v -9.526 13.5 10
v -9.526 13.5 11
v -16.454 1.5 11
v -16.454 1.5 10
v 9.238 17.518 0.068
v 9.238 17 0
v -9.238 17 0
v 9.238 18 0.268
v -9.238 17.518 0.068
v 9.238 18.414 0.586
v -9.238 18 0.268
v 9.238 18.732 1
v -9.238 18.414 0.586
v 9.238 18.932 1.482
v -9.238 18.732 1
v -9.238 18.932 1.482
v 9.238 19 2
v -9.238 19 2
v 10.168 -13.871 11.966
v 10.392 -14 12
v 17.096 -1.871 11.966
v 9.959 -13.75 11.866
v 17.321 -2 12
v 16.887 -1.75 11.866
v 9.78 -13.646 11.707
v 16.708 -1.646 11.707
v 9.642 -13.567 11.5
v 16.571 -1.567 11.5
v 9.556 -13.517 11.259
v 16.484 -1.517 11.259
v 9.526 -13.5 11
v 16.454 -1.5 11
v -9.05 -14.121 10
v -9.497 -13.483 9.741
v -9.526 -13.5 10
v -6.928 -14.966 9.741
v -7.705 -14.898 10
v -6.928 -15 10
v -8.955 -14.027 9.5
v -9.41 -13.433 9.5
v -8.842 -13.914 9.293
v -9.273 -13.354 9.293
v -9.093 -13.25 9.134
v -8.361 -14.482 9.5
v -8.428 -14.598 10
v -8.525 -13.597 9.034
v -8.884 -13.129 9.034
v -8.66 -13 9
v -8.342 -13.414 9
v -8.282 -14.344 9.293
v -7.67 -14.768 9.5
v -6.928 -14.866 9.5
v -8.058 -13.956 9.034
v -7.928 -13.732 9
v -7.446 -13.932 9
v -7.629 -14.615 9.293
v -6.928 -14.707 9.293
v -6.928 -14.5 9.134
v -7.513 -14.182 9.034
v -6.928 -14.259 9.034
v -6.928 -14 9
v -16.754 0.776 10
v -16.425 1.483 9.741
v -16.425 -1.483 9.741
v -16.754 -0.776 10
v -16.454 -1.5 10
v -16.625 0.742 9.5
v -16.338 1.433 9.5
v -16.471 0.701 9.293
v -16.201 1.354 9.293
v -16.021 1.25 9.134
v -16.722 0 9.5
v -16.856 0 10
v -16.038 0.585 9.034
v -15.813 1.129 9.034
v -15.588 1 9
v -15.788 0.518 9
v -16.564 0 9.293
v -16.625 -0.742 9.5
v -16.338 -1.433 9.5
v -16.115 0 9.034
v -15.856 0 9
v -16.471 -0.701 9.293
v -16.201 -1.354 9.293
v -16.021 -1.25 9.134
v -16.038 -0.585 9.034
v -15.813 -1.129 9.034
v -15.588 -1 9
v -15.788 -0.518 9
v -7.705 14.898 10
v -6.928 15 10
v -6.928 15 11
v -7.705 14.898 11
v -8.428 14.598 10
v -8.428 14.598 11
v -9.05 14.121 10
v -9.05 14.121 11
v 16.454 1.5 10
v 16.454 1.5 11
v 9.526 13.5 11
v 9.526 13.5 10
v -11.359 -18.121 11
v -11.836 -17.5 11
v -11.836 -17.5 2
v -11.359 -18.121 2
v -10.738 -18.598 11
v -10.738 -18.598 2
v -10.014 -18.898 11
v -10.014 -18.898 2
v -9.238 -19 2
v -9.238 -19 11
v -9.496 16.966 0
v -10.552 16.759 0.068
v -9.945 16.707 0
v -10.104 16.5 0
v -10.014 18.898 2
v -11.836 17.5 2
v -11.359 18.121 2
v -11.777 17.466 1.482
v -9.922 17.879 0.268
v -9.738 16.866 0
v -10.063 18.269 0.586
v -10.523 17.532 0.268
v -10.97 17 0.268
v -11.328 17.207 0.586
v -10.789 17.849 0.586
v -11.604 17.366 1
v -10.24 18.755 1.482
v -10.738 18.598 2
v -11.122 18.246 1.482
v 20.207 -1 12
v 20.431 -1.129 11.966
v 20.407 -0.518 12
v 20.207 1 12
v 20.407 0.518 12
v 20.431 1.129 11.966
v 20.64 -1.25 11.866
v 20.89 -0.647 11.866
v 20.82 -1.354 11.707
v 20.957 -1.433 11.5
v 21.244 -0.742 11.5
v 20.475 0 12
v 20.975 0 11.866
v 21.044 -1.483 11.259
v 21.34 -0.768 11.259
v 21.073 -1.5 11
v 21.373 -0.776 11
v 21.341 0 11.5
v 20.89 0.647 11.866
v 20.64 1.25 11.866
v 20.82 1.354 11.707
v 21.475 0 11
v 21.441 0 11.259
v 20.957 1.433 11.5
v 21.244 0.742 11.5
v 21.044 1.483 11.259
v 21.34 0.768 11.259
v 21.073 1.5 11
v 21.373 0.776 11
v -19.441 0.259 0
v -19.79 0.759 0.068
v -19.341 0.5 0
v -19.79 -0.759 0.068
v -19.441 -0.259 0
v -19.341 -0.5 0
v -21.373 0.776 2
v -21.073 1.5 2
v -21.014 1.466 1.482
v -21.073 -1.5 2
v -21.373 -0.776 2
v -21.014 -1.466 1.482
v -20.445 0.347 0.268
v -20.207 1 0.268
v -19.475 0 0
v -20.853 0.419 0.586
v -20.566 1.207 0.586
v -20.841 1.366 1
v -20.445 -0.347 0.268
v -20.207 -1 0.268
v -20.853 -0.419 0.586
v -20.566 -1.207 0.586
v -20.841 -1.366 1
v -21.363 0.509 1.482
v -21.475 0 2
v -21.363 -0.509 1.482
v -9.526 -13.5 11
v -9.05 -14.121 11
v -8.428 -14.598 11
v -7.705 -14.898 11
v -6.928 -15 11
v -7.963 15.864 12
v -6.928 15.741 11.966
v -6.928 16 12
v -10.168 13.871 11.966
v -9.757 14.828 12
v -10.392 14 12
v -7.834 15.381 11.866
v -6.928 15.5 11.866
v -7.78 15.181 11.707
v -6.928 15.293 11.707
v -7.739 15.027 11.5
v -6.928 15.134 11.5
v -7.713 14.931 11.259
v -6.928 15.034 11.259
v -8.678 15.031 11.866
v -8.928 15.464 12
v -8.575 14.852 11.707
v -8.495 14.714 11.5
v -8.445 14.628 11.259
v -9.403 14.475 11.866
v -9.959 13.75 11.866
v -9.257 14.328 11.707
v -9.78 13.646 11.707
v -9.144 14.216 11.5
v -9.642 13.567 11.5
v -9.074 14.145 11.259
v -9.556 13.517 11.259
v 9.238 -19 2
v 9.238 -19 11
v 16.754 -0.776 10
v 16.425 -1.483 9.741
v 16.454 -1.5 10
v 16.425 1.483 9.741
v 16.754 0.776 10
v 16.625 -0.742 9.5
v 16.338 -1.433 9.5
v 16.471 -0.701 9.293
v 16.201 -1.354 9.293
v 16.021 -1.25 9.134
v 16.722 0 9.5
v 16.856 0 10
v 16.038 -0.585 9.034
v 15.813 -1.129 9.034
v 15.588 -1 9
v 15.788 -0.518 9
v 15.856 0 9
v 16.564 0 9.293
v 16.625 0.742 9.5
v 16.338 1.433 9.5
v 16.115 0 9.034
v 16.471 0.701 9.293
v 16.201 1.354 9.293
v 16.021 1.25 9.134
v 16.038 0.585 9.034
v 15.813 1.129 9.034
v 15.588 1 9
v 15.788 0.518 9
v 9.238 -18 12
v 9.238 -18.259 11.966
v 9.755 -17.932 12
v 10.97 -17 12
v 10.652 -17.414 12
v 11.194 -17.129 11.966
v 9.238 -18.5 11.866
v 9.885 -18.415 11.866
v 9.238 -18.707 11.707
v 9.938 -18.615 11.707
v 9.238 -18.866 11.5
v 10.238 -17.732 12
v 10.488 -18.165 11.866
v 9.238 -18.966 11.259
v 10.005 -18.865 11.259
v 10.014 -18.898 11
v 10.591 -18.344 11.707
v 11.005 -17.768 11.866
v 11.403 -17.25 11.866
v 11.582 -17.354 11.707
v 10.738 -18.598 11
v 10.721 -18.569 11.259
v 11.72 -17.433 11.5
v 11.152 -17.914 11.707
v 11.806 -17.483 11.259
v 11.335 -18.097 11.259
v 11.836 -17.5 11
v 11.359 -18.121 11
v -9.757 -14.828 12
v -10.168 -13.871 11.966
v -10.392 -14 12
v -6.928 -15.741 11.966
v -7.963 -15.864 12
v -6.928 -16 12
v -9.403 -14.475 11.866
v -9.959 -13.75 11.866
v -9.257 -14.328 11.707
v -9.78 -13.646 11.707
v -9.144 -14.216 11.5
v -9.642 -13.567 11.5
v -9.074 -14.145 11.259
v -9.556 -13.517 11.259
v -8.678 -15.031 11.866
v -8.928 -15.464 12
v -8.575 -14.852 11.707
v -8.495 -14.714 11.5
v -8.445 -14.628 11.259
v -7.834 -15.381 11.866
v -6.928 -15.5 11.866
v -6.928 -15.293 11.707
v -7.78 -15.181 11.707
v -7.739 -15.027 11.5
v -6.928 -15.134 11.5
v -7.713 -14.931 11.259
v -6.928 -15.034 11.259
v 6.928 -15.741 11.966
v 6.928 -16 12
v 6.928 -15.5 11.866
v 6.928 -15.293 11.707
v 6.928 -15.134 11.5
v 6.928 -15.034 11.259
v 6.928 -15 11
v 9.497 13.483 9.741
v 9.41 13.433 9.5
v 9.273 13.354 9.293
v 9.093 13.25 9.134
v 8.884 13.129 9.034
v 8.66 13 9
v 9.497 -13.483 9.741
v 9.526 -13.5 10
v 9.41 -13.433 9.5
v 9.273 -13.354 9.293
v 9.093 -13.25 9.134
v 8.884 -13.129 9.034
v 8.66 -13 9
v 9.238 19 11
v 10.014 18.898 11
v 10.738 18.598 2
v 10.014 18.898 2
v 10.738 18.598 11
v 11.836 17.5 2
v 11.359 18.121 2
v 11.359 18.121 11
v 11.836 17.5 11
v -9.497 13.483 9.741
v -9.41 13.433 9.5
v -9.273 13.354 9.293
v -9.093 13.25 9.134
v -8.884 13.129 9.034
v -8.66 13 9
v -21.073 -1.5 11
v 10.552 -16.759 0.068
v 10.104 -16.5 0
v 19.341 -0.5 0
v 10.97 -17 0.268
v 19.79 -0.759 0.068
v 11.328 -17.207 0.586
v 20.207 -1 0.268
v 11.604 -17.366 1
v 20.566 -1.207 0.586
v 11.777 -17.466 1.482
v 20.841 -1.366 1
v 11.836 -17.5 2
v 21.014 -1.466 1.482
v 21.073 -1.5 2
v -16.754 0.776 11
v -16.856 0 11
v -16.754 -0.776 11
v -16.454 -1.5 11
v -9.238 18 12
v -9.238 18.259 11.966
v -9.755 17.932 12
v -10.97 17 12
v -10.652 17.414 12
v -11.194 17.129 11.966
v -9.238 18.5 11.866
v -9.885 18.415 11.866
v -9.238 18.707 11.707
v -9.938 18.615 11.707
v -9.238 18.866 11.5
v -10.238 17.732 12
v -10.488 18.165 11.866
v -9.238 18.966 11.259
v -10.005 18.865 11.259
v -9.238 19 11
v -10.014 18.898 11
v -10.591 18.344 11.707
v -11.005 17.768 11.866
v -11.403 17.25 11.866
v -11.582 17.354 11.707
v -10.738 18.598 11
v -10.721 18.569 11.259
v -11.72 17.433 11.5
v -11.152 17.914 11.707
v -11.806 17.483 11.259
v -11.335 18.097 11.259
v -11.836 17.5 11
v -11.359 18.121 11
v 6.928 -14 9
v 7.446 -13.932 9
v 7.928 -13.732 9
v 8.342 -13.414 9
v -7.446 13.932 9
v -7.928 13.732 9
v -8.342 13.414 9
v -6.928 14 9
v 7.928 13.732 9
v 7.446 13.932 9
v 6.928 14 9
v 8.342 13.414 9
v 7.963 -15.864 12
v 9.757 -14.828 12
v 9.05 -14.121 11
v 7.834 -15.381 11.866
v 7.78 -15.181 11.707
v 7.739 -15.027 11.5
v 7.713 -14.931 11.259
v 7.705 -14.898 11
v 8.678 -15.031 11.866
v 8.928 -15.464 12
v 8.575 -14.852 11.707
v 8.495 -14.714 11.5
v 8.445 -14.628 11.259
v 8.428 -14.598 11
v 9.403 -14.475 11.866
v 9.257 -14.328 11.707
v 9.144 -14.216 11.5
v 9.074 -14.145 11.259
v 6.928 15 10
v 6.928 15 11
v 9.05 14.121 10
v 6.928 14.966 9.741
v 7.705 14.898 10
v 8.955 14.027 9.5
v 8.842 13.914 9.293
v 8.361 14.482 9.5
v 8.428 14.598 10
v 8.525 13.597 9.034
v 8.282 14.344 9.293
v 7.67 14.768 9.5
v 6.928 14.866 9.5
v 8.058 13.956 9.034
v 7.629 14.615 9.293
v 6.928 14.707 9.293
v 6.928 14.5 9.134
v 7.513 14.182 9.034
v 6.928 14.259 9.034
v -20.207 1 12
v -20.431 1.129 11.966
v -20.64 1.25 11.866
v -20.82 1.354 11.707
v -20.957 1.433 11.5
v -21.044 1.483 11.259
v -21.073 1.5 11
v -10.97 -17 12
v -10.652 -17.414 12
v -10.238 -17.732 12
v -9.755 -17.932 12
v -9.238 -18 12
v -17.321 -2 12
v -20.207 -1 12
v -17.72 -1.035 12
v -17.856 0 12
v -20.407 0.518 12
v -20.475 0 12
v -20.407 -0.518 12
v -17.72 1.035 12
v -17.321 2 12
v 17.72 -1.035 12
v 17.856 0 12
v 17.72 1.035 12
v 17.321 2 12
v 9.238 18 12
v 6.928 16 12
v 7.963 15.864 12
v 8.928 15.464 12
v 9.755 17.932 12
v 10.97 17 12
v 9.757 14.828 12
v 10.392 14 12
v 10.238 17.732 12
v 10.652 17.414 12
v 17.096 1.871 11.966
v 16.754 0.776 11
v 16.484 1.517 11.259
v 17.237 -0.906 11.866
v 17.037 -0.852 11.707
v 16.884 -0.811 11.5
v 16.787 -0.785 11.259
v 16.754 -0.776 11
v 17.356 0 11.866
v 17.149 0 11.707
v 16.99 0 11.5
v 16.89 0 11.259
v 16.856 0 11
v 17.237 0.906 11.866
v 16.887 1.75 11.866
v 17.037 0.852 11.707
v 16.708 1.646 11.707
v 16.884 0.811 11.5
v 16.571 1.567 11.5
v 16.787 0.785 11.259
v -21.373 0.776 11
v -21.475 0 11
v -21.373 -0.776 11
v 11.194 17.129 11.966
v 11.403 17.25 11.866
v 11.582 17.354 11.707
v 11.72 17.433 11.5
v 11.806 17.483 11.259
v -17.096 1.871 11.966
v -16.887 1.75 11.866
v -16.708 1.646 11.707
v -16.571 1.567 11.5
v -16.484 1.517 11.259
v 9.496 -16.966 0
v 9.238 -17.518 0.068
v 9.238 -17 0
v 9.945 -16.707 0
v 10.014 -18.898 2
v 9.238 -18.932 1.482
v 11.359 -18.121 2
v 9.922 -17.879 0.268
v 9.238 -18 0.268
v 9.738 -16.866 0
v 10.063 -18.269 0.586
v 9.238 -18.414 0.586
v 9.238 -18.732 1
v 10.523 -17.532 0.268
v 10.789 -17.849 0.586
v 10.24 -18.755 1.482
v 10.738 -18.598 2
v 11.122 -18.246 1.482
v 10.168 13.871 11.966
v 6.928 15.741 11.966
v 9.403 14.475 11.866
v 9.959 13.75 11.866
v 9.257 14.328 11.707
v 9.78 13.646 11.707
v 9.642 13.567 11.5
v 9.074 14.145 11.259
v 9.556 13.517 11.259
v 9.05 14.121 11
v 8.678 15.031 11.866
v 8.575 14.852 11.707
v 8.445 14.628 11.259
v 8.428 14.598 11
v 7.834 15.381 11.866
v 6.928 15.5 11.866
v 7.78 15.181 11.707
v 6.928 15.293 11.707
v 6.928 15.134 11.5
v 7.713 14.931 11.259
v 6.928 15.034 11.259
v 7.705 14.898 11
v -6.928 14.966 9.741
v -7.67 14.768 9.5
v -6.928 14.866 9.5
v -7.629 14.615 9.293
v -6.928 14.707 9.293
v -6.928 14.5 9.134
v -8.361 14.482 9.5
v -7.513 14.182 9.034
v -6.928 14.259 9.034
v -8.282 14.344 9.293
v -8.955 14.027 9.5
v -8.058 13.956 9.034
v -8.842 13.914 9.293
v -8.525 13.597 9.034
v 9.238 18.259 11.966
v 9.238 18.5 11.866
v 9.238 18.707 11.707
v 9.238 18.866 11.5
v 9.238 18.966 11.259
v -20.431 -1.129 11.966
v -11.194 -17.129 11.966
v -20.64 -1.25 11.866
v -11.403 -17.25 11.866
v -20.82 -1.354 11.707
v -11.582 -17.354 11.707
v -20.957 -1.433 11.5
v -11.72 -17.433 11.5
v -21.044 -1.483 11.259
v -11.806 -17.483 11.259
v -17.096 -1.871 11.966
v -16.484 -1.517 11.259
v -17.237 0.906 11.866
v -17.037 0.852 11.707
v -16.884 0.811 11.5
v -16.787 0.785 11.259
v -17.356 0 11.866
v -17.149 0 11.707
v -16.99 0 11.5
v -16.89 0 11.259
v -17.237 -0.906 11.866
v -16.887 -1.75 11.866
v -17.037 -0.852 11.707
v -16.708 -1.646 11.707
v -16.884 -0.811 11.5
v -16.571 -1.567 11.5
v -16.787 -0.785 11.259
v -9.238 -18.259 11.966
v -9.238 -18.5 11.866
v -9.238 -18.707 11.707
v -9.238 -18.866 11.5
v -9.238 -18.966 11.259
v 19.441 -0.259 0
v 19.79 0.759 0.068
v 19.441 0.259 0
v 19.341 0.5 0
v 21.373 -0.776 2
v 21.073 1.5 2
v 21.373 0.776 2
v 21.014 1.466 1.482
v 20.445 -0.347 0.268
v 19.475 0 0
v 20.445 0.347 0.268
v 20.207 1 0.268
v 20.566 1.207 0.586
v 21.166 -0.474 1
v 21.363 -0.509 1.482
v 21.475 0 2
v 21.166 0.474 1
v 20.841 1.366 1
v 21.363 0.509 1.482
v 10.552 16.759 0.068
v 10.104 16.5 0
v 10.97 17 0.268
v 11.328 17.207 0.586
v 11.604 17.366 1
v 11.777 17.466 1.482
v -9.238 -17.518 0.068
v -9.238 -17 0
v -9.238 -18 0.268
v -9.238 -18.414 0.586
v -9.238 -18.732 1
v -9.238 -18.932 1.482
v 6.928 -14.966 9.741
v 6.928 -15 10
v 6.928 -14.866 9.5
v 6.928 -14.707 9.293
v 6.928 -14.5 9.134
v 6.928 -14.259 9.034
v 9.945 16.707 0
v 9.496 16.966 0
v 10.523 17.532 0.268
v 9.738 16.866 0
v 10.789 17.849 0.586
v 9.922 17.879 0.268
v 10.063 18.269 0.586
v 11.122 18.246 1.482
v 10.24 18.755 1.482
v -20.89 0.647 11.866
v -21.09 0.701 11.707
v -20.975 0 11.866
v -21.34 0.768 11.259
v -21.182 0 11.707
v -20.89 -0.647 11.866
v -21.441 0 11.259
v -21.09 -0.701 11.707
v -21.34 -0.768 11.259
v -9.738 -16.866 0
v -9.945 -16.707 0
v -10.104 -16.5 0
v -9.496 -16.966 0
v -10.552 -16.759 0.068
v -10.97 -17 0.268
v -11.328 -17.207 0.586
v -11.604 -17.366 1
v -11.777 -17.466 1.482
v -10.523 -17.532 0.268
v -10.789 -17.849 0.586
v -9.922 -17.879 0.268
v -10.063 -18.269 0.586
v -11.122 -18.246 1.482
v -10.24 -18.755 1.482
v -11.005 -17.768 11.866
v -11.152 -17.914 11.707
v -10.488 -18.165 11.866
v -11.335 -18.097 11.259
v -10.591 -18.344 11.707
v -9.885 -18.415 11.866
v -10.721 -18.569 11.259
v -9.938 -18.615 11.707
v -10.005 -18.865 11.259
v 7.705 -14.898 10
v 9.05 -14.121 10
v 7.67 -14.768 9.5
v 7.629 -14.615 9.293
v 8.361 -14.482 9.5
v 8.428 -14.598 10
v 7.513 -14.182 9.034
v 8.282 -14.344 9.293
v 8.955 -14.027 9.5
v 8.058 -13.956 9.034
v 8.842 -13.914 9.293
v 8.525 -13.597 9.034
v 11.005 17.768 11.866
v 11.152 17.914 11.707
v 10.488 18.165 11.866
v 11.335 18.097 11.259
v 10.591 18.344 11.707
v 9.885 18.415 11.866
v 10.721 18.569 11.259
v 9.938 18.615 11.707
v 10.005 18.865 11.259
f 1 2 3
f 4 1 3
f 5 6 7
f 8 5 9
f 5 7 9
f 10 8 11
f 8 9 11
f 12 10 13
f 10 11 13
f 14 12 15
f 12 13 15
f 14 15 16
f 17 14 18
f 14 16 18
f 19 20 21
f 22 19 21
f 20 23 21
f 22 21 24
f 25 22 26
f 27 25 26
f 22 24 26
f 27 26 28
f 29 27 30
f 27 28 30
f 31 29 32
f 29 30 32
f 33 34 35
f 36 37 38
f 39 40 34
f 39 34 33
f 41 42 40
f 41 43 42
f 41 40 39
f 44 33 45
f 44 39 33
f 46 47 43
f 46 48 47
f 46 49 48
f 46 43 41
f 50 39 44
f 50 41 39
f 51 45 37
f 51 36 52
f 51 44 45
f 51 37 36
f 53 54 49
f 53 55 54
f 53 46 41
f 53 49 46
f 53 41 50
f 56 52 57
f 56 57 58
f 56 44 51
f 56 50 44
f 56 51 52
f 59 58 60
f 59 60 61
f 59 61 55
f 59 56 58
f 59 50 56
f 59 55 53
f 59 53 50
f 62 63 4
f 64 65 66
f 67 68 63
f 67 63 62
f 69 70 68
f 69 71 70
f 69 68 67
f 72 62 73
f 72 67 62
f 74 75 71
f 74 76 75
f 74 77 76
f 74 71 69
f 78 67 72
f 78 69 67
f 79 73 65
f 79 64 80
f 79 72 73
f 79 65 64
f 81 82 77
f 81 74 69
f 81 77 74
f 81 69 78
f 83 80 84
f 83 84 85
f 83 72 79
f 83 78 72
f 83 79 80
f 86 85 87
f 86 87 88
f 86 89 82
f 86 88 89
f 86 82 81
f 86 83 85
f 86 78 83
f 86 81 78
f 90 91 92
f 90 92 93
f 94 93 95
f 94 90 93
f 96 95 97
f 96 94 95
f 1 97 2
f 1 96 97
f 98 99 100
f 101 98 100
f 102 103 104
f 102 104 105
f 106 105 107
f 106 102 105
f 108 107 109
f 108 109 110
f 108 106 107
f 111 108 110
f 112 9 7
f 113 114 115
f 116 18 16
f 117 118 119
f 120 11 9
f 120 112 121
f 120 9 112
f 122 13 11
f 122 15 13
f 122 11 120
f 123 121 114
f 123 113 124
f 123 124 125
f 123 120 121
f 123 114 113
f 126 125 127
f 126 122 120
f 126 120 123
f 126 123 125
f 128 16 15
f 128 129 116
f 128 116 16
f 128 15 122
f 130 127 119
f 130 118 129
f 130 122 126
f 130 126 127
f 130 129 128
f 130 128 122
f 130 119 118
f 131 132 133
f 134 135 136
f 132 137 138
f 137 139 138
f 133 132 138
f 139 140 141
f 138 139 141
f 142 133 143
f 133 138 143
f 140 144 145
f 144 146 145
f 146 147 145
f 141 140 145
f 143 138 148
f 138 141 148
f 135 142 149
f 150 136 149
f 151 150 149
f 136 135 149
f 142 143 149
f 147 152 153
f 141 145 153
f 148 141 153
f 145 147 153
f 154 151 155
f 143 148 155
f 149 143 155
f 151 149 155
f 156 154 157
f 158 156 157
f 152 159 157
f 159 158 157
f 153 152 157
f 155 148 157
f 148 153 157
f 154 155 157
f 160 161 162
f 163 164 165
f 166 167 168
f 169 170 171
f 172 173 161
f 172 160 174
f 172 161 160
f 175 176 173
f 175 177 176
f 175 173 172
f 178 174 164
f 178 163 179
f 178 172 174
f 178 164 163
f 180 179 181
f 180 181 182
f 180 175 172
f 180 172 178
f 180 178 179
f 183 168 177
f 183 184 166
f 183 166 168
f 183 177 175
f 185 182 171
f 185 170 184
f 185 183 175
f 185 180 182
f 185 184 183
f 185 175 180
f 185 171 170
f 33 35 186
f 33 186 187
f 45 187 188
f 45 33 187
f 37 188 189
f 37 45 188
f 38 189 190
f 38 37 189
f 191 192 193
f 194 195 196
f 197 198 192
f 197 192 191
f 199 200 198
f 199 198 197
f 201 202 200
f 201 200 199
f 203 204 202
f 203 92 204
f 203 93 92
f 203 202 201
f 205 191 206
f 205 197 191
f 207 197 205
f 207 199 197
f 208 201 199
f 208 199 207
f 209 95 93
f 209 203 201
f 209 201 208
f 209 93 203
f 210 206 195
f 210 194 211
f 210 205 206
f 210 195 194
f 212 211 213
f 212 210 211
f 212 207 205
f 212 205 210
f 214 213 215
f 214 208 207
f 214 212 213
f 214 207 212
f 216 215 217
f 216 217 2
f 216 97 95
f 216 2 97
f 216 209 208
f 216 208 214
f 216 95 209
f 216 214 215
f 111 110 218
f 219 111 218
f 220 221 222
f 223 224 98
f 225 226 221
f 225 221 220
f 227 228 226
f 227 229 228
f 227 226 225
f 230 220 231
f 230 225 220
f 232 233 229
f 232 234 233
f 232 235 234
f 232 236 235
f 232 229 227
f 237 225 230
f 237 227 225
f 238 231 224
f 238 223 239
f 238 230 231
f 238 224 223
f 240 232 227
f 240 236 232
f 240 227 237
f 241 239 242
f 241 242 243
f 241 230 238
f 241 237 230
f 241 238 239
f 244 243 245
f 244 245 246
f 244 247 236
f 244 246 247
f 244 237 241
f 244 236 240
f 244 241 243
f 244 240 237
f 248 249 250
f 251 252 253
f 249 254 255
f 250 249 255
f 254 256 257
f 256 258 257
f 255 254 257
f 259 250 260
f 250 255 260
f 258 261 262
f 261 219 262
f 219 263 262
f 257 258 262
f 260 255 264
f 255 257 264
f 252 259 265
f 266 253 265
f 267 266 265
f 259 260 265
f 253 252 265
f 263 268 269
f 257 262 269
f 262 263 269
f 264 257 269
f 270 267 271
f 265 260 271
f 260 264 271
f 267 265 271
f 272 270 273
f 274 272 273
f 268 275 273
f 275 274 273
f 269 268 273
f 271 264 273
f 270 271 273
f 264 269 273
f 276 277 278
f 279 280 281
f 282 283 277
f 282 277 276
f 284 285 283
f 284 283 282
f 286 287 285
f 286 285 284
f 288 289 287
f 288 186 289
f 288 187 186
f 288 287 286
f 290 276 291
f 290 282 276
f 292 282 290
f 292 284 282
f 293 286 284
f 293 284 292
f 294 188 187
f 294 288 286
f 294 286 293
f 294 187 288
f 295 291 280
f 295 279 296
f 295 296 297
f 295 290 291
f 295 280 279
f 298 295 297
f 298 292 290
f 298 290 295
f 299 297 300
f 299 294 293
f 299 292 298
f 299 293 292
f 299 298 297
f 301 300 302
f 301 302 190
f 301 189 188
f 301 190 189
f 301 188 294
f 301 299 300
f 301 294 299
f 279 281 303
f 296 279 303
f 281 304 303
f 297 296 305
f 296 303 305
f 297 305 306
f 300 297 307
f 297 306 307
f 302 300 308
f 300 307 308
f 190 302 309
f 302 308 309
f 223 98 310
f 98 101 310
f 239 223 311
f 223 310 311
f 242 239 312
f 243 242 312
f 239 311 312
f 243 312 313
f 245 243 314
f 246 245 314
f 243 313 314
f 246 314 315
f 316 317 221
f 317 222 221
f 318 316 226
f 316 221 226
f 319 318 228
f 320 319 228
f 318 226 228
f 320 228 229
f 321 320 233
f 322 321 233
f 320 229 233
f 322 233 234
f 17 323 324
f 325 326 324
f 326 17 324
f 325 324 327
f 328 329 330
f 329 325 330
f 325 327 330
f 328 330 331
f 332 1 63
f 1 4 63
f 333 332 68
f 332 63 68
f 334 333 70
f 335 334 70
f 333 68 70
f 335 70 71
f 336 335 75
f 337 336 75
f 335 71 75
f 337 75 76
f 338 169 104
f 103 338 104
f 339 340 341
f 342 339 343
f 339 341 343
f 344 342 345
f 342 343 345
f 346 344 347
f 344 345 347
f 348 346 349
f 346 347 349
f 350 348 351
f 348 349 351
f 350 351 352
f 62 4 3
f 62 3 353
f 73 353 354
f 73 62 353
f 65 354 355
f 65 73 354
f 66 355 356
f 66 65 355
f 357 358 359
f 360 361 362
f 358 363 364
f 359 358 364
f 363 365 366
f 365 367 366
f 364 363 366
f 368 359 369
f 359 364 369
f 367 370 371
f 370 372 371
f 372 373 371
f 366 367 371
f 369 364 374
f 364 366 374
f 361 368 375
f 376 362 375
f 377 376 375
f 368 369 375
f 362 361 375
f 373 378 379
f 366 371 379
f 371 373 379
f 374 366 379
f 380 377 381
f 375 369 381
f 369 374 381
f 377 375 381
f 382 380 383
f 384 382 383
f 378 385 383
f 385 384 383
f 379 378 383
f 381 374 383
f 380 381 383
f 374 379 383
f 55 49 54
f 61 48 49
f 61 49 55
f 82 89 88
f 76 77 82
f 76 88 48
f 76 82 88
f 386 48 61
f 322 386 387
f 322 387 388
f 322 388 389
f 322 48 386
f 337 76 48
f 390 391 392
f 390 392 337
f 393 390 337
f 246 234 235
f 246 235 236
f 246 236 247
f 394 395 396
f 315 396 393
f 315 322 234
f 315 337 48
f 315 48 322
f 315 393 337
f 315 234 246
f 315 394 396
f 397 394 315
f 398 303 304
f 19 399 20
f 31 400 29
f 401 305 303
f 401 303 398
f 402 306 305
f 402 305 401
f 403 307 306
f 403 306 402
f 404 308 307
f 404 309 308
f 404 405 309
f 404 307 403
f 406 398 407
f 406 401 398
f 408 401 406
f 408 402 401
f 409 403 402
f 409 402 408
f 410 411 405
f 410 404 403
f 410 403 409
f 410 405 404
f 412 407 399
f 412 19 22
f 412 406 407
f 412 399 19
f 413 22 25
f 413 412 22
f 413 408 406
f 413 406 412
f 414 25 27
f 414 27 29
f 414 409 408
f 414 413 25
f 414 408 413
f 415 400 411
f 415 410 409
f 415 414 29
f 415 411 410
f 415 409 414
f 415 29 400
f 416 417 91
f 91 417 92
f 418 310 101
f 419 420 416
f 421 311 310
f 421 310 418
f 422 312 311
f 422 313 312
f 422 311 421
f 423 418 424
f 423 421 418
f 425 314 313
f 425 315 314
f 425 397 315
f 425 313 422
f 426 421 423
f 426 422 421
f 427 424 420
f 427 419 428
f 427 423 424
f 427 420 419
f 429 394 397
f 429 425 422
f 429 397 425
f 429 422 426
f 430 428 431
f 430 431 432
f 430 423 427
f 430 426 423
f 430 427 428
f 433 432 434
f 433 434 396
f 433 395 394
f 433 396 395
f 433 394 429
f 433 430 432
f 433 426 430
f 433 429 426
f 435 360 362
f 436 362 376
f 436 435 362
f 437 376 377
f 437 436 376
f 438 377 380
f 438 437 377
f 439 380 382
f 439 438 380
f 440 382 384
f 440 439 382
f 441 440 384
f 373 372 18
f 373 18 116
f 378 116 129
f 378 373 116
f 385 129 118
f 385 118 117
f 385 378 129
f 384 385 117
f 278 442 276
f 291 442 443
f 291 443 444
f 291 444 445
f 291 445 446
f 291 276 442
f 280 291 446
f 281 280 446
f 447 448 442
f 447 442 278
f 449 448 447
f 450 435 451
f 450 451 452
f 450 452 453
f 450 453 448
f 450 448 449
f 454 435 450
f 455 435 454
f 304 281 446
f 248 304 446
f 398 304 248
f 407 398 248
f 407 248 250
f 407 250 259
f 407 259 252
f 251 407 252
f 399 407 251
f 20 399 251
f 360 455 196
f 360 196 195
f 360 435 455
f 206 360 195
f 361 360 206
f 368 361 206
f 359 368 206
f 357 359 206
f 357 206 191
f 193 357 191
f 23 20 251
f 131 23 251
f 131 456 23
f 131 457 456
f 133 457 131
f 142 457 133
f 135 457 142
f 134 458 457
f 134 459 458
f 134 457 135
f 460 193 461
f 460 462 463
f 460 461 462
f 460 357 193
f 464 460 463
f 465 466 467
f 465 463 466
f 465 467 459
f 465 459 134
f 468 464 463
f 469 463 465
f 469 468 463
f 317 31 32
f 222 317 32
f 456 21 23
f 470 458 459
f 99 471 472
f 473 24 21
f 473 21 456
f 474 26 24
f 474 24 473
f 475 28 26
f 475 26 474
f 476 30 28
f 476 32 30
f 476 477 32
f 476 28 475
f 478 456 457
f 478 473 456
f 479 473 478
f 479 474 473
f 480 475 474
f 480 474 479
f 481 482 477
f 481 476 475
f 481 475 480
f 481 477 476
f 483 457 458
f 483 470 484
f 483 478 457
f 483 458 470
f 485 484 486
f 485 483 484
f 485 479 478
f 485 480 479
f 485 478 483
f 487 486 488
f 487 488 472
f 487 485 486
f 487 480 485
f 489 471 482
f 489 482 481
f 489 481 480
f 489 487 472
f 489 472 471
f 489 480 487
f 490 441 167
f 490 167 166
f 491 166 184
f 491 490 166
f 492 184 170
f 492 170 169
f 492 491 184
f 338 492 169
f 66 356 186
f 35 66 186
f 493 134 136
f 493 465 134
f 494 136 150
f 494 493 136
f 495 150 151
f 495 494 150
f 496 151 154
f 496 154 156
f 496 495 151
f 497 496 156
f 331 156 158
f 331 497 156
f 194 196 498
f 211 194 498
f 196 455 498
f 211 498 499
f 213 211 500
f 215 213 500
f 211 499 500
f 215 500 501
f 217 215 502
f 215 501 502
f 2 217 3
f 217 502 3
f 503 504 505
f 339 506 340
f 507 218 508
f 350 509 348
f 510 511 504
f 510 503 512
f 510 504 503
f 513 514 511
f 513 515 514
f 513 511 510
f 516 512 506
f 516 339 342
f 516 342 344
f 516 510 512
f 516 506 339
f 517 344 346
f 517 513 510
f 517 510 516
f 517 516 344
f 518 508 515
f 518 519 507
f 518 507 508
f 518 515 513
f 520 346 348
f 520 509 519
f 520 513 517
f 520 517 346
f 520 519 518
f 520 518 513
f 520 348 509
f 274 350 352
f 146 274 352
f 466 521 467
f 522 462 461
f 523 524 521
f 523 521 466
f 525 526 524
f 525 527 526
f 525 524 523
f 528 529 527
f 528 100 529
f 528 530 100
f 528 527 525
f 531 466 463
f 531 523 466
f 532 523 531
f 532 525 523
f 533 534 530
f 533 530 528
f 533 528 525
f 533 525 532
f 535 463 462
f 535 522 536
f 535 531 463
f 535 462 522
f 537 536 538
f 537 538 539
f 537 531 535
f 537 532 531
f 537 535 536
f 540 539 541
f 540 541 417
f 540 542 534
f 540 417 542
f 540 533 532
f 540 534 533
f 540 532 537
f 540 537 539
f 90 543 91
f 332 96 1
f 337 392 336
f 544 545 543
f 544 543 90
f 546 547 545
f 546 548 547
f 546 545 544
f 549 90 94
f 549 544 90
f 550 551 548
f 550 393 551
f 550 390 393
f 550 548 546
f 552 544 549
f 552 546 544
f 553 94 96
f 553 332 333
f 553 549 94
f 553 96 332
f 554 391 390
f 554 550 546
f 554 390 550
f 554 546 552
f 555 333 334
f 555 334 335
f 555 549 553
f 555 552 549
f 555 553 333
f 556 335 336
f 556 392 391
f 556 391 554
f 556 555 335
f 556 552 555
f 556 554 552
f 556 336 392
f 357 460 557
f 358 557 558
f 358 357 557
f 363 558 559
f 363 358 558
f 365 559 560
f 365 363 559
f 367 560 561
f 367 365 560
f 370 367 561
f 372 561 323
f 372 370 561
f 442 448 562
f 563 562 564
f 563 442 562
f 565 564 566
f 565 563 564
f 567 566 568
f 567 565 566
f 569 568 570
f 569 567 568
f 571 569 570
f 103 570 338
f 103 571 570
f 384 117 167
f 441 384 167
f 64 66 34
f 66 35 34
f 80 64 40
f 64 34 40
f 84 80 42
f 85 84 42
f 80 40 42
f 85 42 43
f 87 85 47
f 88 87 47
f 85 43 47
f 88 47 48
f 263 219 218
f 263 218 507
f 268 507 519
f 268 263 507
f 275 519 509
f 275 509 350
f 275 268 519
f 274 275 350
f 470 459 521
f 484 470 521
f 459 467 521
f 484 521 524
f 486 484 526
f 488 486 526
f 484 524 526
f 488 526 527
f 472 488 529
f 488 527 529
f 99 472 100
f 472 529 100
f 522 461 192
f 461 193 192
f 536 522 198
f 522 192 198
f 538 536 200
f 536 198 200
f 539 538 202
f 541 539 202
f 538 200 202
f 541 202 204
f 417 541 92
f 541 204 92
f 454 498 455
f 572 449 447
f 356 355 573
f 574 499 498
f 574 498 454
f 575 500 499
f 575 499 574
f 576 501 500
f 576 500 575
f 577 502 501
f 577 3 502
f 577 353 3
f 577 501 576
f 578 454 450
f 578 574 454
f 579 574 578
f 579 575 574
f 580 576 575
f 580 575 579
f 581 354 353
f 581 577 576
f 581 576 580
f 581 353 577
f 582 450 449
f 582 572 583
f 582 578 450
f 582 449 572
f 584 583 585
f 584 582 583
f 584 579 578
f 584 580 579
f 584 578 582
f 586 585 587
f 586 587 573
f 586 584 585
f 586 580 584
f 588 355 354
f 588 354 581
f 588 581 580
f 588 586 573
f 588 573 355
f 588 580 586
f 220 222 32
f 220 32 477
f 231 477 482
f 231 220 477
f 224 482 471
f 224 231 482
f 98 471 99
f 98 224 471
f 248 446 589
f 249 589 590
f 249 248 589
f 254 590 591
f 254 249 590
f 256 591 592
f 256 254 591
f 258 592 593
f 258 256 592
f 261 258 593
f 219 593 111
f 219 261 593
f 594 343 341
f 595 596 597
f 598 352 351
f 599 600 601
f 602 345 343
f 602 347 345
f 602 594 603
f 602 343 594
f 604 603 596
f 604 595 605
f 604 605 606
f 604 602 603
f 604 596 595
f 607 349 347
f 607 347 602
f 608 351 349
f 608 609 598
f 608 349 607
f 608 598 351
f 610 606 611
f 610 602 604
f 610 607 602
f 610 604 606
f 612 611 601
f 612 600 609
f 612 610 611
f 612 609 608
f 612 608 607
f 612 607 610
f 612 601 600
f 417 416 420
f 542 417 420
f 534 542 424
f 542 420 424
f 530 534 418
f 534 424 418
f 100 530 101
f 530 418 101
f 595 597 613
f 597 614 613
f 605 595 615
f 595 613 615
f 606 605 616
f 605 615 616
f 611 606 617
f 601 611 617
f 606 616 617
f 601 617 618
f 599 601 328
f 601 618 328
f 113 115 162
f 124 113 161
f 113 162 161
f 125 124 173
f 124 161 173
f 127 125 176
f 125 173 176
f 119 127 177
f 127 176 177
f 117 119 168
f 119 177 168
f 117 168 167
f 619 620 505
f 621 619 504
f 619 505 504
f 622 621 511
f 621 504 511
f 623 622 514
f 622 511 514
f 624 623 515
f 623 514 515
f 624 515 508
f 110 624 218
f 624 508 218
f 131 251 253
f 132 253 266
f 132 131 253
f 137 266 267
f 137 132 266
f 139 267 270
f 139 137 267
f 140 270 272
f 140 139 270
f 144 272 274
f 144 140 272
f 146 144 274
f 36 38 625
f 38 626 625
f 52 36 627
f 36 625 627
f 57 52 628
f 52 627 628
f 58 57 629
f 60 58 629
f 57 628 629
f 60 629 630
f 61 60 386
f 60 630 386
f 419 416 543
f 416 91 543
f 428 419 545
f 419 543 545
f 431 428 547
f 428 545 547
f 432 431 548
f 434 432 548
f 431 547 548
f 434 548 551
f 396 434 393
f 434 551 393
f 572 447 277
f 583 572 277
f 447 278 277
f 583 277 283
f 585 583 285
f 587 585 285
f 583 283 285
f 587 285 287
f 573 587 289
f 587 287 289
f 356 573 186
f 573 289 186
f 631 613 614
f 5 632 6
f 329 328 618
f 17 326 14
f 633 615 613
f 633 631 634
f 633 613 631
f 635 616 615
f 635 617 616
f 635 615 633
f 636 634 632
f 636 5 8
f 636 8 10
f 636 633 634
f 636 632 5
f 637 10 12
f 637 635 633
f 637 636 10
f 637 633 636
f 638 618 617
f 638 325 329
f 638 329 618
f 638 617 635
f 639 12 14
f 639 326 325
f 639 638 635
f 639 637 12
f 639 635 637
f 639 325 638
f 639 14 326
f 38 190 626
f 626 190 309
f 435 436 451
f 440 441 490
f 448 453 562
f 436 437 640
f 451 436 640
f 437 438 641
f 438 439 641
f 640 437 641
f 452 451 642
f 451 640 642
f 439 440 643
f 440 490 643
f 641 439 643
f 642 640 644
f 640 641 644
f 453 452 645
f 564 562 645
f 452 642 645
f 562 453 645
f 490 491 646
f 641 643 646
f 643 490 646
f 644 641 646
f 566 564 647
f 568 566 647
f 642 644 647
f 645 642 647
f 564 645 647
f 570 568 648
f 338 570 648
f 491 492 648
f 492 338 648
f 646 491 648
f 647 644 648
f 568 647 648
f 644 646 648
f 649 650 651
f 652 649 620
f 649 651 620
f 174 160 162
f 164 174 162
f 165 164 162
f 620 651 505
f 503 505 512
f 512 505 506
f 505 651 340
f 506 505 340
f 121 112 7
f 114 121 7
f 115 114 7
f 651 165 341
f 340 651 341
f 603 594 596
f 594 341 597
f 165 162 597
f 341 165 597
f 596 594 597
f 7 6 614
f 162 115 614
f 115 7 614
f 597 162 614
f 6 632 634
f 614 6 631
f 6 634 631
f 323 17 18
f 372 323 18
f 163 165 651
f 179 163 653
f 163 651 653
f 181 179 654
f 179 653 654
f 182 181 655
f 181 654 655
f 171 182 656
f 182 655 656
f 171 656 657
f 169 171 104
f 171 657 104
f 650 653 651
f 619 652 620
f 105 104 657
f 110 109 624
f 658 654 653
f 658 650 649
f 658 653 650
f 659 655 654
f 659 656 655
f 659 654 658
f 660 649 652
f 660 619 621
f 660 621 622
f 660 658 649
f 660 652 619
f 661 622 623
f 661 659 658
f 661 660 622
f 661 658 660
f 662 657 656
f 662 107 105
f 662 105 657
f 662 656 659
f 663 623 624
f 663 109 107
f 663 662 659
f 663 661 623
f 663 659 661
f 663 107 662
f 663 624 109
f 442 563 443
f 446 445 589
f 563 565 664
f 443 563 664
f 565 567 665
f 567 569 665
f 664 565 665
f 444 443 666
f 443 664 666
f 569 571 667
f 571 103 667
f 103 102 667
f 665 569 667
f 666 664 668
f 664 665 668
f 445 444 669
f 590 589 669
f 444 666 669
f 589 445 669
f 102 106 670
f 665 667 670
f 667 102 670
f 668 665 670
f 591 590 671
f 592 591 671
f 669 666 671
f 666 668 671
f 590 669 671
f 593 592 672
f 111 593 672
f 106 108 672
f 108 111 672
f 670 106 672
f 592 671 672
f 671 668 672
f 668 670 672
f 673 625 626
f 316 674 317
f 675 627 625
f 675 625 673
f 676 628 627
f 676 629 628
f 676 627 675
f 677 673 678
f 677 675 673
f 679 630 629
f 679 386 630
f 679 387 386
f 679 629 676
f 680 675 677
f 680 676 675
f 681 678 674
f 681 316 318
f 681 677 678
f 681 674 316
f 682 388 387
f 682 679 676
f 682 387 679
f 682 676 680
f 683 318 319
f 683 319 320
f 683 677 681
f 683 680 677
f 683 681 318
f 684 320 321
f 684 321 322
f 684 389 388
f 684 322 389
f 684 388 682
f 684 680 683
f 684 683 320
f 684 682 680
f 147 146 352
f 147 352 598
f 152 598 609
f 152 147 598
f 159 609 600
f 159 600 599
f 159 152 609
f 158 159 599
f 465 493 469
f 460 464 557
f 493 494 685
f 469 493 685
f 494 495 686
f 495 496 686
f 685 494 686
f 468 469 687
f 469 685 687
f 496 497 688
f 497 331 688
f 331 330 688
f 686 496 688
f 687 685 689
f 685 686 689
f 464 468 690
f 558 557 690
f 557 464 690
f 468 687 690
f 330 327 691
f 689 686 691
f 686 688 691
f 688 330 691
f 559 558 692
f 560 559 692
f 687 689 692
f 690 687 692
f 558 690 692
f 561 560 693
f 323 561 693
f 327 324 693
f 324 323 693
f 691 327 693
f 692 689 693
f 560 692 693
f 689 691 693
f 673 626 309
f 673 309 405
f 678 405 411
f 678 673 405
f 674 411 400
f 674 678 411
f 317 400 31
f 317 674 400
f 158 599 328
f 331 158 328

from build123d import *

# Parameters (mm, degrees)
F1_DEPTH = 12
F2_R     = 3
F3_R     = 2
F5_DEPTH = 3
F6_R     = 3
F7_R     = 1
F8_R     = 1


with BuildPart() as f1:
    # F0 (on Top) → F1 (new body)
    with BuildSketch(Plane.XY):
        Polygon((10.9696551146, 19), (-10.9696551146, 19), (-21.9393102292, 0), (-10.9696551146, -19), (10.9696551146, -19), (21.9393102292, 0), align=None)
    extrude(amount=F1_DEPTH)

    # F2
    f2_edges = [f1.edges().sort_by_distance(p)[0] for p in [
        (-10.969655, -19, 6),
        (10.969655, -19, 6),
        (21.93931, 0, 6),
        (-21.93931, 0, 6),
        (-10.969655, 19, 6),
        (10.969655, 19, 6),
    ]]
    fillet(f2_edges, radius=F2_R)

    # F3
    f3_edges = [f1.edges().sort_by_distance(p)[0] for p in [
        (16.454483, 9.5, 0),
        (21.475209, 0, 0),
        (10.737604, 18.598076, 0),
        (16.454483, -9.5, 0),
        (0, 19, 0),
        (10.737604, -18.598076, 0),
        (-10.737604, 18.598076, 0),
        (0, -19, 0),
        (-16.454483, 9.5, 0),
        (-10.737604, -18.598076, 0),
        (-21.475209, 0, 0),
        (-16.454483, -9.5, 0),
    ]]
    fillet(f3_edges, radius=F3_R)

    # F4 (on face) → F5 (cut)
    with BuildSketch(Plane.XY.offset(12)):
        Polygon((8.6602540378, 15), (-8.6602540378, 15), (-17.3205080757, 0), (-8.6602540378, -15), (8.6602540378, -15), (17.3205080757, 0), align=None)
    extrude(amount=-F5_DEPTH, mode=Mode.SUBTRACT)

    # F6
    f6_edges = [f1.edges().sort_by_distance(p)[0] for p in [
        (-8.660254, 15, 10.5),
        (8.660254, 15, 10.5),
        (17.320508, 0, 10.5),
        (-17.320508, 0, 10.5),
        (-8.660254, -15, 10.5),
        (8.660254, -15, 10.5),
    ]]
    fillet(f6_edges, radius=F6_R)

    # F7
    f7_edges = [f1.edges().sort_by_distance(p)[0] for p in [
        (0, 15, 12),
        (8.428203, 14.598076, 12),
        (-8.428203, 14.598076, 12),
        (12.990381, 7.5, 12),
        (-12.990381, 7.5, 12),
        (16.856406, 0, 12),
        (-16.856406, 0, 12),
        (12.990381, -7.5, 12),
        (-12.990381, -7.5, 12),
        (8.428203, -14.598076, 12),
        (-8.428203, -14.598076, 12),
        (0, -15, 12),
        (16.454483, 9.5, 12),
        (21.475209, 0, 12),
        (10.737604, 18.598076, 12),
        (16.454483, -9.5, 12),
        (0, 19, 12),
        (10.737604, -18.598076, 12),
        (-10.737604, 18.598076, 12),
        (0, -19, 12),
        (-16.454483, 9.5, 12),
        (-10.737604, -18.598076, 12),
        (-21.475209, 0, 12),
        (-16.454483, -9.5, 12),
    ]]
    fillet(f7_edges, radius=F7_R)

    # F8
    f8_edges = [f1.edges().sort_by_distance(p)[0] for p in [
        (0, 15, 9),
        (8.428203, 14.598076, 9),
        (-8.428203, 14.598076, 9),
        (12.990381, 7.5, 9),
        (-12.990381, 7.5, 9),
        (16.856406, 0, 9),
        (-16.856406, 0, 9),
        (12.990381, -7.5, 9),
        (-12.990381, -7.5, 9),
        (8.428203, -14.598076, 9),
        (-8.428203, -14.598076, 9),
        (0, -15, 9),
    ]]
    fillet(f8_edges, radius=F8_R)


solid = f1.part
